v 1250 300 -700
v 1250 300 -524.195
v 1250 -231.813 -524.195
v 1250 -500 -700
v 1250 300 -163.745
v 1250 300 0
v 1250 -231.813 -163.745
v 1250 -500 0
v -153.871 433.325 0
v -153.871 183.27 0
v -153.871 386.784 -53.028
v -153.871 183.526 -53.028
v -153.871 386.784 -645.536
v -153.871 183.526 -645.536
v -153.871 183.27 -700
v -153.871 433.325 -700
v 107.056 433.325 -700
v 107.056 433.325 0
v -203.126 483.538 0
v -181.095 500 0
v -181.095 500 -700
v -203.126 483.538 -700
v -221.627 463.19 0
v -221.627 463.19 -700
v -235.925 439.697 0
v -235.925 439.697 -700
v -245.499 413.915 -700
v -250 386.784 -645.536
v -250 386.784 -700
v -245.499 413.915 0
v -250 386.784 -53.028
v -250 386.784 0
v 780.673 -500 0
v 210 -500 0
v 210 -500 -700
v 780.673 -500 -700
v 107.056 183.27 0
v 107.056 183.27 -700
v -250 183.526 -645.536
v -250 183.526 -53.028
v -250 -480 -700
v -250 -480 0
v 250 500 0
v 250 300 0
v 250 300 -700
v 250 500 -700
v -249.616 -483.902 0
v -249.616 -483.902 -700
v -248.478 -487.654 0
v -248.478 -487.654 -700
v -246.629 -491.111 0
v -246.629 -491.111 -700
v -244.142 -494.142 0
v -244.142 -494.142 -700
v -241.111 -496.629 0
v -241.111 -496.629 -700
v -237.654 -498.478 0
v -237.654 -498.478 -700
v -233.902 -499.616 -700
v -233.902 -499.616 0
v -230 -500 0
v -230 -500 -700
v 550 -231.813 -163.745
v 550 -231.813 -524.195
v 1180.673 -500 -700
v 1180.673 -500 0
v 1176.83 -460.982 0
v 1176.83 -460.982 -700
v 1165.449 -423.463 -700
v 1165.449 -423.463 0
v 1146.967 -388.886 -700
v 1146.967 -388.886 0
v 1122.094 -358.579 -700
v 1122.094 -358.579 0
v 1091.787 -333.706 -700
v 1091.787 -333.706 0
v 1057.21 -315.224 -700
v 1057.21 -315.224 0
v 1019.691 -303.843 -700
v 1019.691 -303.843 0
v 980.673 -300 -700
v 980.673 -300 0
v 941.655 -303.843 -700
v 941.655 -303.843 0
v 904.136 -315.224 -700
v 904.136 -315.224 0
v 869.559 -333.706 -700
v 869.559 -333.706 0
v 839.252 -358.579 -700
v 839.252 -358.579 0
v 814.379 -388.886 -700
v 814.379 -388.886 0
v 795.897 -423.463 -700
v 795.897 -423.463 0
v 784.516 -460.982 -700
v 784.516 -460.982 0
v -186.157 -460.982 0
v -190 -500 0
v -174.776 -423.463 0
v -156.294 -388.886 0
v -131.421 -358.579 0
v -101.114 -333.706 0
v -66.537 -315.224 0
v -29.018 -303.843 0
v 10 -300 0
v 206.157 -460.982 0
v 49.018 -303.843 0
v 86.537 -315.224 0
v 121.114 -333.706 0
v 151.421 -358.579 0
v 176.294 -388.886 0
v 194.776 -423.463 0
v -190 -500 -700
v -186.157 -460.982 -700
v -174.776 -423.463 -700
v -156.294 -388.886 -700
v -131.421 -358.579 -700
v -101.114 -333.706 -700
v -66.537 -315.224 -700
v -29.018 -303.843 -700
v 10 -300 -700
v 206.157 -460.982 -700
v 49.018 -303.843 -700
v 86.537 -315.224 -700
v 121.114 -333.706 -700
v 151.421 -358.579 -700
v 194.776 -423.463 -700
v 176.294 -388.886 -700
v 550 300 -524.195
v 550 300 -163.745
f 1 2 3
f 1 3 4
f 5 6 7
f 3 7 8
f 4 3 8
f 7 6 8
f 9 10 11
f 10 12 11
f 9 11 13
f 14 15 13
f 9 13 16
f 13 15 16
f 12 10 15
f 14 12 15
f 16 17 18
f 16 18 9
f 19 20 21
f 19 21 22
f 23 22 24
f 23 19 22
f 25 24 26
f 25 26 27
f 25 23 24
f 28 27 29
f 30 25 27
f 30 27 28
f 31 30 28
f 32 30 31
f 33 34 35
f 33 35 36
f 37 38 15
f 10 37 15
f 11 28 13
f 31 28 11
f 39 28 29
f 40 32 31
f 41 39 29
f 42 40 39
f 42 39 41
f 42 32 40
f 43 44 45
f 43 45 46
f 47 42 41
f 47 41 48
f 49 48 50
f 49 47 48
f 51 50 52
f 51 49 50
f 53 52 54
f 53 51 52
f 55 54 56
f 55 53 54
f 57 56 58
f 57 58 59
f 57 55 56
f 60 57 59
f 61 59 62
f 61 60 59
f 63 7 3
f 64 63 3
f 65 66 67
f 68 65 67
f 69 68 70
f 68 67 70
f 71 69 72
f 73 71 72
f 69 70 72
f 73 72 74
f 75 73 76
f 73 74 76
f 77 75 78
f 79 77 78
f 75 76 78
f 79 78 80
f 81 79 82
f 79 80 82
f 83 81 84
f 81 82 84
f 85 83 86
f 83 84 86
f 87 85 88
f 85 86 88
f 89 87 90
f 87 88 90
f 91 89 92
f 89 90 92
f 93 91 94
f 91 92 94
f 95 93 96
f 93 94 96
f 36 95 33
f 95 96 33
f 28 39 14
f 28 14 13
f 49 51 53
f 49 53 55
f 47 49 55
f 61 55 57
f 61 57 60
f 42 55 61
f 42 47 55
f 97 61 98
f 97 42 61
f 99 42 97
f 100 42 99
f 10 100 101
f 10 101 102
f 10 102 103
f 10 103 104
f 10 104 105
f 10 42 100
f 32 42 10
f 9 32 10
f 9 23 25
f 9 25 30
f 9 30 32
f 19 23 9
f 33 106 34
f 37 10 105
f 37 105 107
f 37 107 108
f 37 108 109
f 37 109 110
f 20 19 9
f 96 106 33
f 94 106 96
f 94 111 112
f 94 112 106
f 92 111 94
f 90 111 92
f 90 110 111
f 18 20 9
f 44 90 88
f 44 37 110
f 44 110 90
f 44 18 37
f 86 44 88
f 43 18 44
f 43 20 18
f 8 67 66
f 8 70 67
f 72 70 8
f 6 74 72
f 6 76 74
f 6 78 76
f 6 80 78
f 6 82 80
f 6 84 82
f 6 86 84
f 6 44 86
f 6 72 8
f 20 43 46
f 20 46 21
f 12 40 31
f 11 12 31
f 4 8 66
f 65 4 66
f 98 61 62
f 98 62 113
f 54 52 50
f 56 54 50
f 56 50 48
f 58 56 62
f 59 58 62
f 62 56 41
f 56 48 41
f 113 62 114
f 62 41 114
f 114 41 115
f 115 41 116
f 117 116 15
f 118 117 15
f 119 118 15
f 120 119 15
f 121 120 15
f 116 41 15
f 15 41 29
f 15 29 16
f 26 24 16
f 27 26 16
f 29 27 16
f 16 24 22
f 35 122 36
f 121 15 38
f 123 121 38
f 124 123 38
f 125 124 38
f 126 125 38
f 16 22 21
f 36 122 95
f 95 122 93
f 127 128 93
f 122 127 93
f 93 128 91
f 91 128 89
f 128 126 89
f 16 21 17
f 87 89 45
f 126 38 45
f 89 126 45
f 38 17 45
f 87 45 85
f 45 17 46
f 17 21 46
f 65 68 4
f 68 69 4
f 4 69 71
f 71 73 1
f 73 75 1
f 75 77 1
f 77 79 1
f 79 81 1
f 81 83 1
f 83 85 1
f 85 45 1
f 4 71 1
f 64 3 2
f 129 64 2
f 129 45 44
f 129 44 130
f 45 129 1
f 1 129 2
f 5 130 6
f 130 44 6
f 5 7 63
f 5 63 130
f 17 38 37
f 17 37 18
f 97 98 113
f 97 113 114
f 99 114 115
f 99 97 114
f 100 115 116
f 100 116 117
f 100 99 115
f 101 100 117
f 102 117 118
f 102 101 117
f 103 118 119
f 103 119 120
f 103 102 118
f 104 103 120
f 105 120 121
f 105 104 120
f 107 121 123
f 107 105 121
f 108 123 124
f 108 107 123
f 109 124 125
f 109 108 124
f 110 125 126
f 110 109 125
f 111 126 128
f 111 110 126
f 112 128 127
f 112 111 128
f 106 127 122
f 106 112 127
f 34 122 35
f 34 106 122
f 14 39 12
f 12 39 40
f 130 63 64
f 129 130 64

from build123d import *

# Parameters (mm, degrees)
Y_KSEKLIK_EKSTR_ZYON1_DEPTH = 700
IZIM2_W                     = 360.449824165
IZIM2_H                     = 531.81345569
KES_EKSTR_ZYON1_DEPTH       = 700
IZIM3_W                     = 260.927179237
IZIM3_H                     = 250.055213435
KES_EKSTR_ZYON2_DEPTH       = 700
IZIM4_W                     = 592.507682974
IZIM4_H                     = 203.257851284
KES_EKSTR_ZYON3_DEPTH       = 100


with BuildPart() as part:
    # Çizim1 → Yükseklik-Ekstrüzyon1 (new body)
    with BuildSketch(Plane.XY):
        with BuildLine():
            Line((210, -500), (250, -500))
            Line((250, -500), (250, 300))
            Line((250, 300), (250, 500))
            Line((250, 500), (-181.095158938, 500))
            ThreePointArc((-181.095158938, 500), (-229.338190574, 451.785260133), (-250, 386.784176503))
            Line((-250, 386.784176503), (-250, -480))
            ThreePointArc((-250, -480), (-244.142135624, -494.142135624), (-230, -500))
            Line((-230, -500), (-190, -500))
            ThreePointArc((-190, -500), (10, -300), (210, -500))
        make_face()
        with BuildLine():
            ThreePointArc((1180.672940492, -500), (980.672940492, -300), (780.672940492, -500))
            Line((780.672940492, -500), (250, -500))
            Line((250, -500), (250, 300))
            Line((250, 300), (1250, 300))
            Line((1250, 300), (1250, -500))
            Line((1250, -500), (1180.672940492, -500))
        make_face()
    extrude(amount=-Y_KSEKLIK_EKSTR_ZYON1_DEPTH)

    # Çizim2 → Kes-Ekstrüzyon1 (cut)
    with BuildSketch(Plane(origin=(1250, 0, 0), x_dir=(0, 0, -1), z_dir=(1, 0, 0))):
        with Locations((343.970170228, 34.093272155)):
            Rectangle(IZIM2_W, IZIM2_H)
    extrude(amount=-KES_EKSTR_ZYON1_DEPTH, mode=Mode.SUBTRACT)

    # Çizim3 → Kes-Ekstrüzyon2 (cut)
    with BuildSketch(Plane(origin=(0, 0, -700), x_dir=(-1, 0, 0), z_dir=(0, 0, -1))):
        with Locations((23.407496445, 308.297887372)):
            Rectangle(IZIM3_W, IZIM3_H)
    extrude(amount=-KES_EKSTR_ZYON2_DEPTH, mode=Mode.SUBTRACT)

    # Çizim4 → Kes-Ekstrüzyon3 (cut)
    with BuildSketch(Plane.ZY.offset(250)):
        with Locations((-349.282031692, 285.155250861)):
            Rectangle(IZIM4_W, IZIM4_H)
    extrude(amount=-KES_EKSTR_ZYON3_DEPTH, mode=Mode.SUBTRACT)


solid = part.part
